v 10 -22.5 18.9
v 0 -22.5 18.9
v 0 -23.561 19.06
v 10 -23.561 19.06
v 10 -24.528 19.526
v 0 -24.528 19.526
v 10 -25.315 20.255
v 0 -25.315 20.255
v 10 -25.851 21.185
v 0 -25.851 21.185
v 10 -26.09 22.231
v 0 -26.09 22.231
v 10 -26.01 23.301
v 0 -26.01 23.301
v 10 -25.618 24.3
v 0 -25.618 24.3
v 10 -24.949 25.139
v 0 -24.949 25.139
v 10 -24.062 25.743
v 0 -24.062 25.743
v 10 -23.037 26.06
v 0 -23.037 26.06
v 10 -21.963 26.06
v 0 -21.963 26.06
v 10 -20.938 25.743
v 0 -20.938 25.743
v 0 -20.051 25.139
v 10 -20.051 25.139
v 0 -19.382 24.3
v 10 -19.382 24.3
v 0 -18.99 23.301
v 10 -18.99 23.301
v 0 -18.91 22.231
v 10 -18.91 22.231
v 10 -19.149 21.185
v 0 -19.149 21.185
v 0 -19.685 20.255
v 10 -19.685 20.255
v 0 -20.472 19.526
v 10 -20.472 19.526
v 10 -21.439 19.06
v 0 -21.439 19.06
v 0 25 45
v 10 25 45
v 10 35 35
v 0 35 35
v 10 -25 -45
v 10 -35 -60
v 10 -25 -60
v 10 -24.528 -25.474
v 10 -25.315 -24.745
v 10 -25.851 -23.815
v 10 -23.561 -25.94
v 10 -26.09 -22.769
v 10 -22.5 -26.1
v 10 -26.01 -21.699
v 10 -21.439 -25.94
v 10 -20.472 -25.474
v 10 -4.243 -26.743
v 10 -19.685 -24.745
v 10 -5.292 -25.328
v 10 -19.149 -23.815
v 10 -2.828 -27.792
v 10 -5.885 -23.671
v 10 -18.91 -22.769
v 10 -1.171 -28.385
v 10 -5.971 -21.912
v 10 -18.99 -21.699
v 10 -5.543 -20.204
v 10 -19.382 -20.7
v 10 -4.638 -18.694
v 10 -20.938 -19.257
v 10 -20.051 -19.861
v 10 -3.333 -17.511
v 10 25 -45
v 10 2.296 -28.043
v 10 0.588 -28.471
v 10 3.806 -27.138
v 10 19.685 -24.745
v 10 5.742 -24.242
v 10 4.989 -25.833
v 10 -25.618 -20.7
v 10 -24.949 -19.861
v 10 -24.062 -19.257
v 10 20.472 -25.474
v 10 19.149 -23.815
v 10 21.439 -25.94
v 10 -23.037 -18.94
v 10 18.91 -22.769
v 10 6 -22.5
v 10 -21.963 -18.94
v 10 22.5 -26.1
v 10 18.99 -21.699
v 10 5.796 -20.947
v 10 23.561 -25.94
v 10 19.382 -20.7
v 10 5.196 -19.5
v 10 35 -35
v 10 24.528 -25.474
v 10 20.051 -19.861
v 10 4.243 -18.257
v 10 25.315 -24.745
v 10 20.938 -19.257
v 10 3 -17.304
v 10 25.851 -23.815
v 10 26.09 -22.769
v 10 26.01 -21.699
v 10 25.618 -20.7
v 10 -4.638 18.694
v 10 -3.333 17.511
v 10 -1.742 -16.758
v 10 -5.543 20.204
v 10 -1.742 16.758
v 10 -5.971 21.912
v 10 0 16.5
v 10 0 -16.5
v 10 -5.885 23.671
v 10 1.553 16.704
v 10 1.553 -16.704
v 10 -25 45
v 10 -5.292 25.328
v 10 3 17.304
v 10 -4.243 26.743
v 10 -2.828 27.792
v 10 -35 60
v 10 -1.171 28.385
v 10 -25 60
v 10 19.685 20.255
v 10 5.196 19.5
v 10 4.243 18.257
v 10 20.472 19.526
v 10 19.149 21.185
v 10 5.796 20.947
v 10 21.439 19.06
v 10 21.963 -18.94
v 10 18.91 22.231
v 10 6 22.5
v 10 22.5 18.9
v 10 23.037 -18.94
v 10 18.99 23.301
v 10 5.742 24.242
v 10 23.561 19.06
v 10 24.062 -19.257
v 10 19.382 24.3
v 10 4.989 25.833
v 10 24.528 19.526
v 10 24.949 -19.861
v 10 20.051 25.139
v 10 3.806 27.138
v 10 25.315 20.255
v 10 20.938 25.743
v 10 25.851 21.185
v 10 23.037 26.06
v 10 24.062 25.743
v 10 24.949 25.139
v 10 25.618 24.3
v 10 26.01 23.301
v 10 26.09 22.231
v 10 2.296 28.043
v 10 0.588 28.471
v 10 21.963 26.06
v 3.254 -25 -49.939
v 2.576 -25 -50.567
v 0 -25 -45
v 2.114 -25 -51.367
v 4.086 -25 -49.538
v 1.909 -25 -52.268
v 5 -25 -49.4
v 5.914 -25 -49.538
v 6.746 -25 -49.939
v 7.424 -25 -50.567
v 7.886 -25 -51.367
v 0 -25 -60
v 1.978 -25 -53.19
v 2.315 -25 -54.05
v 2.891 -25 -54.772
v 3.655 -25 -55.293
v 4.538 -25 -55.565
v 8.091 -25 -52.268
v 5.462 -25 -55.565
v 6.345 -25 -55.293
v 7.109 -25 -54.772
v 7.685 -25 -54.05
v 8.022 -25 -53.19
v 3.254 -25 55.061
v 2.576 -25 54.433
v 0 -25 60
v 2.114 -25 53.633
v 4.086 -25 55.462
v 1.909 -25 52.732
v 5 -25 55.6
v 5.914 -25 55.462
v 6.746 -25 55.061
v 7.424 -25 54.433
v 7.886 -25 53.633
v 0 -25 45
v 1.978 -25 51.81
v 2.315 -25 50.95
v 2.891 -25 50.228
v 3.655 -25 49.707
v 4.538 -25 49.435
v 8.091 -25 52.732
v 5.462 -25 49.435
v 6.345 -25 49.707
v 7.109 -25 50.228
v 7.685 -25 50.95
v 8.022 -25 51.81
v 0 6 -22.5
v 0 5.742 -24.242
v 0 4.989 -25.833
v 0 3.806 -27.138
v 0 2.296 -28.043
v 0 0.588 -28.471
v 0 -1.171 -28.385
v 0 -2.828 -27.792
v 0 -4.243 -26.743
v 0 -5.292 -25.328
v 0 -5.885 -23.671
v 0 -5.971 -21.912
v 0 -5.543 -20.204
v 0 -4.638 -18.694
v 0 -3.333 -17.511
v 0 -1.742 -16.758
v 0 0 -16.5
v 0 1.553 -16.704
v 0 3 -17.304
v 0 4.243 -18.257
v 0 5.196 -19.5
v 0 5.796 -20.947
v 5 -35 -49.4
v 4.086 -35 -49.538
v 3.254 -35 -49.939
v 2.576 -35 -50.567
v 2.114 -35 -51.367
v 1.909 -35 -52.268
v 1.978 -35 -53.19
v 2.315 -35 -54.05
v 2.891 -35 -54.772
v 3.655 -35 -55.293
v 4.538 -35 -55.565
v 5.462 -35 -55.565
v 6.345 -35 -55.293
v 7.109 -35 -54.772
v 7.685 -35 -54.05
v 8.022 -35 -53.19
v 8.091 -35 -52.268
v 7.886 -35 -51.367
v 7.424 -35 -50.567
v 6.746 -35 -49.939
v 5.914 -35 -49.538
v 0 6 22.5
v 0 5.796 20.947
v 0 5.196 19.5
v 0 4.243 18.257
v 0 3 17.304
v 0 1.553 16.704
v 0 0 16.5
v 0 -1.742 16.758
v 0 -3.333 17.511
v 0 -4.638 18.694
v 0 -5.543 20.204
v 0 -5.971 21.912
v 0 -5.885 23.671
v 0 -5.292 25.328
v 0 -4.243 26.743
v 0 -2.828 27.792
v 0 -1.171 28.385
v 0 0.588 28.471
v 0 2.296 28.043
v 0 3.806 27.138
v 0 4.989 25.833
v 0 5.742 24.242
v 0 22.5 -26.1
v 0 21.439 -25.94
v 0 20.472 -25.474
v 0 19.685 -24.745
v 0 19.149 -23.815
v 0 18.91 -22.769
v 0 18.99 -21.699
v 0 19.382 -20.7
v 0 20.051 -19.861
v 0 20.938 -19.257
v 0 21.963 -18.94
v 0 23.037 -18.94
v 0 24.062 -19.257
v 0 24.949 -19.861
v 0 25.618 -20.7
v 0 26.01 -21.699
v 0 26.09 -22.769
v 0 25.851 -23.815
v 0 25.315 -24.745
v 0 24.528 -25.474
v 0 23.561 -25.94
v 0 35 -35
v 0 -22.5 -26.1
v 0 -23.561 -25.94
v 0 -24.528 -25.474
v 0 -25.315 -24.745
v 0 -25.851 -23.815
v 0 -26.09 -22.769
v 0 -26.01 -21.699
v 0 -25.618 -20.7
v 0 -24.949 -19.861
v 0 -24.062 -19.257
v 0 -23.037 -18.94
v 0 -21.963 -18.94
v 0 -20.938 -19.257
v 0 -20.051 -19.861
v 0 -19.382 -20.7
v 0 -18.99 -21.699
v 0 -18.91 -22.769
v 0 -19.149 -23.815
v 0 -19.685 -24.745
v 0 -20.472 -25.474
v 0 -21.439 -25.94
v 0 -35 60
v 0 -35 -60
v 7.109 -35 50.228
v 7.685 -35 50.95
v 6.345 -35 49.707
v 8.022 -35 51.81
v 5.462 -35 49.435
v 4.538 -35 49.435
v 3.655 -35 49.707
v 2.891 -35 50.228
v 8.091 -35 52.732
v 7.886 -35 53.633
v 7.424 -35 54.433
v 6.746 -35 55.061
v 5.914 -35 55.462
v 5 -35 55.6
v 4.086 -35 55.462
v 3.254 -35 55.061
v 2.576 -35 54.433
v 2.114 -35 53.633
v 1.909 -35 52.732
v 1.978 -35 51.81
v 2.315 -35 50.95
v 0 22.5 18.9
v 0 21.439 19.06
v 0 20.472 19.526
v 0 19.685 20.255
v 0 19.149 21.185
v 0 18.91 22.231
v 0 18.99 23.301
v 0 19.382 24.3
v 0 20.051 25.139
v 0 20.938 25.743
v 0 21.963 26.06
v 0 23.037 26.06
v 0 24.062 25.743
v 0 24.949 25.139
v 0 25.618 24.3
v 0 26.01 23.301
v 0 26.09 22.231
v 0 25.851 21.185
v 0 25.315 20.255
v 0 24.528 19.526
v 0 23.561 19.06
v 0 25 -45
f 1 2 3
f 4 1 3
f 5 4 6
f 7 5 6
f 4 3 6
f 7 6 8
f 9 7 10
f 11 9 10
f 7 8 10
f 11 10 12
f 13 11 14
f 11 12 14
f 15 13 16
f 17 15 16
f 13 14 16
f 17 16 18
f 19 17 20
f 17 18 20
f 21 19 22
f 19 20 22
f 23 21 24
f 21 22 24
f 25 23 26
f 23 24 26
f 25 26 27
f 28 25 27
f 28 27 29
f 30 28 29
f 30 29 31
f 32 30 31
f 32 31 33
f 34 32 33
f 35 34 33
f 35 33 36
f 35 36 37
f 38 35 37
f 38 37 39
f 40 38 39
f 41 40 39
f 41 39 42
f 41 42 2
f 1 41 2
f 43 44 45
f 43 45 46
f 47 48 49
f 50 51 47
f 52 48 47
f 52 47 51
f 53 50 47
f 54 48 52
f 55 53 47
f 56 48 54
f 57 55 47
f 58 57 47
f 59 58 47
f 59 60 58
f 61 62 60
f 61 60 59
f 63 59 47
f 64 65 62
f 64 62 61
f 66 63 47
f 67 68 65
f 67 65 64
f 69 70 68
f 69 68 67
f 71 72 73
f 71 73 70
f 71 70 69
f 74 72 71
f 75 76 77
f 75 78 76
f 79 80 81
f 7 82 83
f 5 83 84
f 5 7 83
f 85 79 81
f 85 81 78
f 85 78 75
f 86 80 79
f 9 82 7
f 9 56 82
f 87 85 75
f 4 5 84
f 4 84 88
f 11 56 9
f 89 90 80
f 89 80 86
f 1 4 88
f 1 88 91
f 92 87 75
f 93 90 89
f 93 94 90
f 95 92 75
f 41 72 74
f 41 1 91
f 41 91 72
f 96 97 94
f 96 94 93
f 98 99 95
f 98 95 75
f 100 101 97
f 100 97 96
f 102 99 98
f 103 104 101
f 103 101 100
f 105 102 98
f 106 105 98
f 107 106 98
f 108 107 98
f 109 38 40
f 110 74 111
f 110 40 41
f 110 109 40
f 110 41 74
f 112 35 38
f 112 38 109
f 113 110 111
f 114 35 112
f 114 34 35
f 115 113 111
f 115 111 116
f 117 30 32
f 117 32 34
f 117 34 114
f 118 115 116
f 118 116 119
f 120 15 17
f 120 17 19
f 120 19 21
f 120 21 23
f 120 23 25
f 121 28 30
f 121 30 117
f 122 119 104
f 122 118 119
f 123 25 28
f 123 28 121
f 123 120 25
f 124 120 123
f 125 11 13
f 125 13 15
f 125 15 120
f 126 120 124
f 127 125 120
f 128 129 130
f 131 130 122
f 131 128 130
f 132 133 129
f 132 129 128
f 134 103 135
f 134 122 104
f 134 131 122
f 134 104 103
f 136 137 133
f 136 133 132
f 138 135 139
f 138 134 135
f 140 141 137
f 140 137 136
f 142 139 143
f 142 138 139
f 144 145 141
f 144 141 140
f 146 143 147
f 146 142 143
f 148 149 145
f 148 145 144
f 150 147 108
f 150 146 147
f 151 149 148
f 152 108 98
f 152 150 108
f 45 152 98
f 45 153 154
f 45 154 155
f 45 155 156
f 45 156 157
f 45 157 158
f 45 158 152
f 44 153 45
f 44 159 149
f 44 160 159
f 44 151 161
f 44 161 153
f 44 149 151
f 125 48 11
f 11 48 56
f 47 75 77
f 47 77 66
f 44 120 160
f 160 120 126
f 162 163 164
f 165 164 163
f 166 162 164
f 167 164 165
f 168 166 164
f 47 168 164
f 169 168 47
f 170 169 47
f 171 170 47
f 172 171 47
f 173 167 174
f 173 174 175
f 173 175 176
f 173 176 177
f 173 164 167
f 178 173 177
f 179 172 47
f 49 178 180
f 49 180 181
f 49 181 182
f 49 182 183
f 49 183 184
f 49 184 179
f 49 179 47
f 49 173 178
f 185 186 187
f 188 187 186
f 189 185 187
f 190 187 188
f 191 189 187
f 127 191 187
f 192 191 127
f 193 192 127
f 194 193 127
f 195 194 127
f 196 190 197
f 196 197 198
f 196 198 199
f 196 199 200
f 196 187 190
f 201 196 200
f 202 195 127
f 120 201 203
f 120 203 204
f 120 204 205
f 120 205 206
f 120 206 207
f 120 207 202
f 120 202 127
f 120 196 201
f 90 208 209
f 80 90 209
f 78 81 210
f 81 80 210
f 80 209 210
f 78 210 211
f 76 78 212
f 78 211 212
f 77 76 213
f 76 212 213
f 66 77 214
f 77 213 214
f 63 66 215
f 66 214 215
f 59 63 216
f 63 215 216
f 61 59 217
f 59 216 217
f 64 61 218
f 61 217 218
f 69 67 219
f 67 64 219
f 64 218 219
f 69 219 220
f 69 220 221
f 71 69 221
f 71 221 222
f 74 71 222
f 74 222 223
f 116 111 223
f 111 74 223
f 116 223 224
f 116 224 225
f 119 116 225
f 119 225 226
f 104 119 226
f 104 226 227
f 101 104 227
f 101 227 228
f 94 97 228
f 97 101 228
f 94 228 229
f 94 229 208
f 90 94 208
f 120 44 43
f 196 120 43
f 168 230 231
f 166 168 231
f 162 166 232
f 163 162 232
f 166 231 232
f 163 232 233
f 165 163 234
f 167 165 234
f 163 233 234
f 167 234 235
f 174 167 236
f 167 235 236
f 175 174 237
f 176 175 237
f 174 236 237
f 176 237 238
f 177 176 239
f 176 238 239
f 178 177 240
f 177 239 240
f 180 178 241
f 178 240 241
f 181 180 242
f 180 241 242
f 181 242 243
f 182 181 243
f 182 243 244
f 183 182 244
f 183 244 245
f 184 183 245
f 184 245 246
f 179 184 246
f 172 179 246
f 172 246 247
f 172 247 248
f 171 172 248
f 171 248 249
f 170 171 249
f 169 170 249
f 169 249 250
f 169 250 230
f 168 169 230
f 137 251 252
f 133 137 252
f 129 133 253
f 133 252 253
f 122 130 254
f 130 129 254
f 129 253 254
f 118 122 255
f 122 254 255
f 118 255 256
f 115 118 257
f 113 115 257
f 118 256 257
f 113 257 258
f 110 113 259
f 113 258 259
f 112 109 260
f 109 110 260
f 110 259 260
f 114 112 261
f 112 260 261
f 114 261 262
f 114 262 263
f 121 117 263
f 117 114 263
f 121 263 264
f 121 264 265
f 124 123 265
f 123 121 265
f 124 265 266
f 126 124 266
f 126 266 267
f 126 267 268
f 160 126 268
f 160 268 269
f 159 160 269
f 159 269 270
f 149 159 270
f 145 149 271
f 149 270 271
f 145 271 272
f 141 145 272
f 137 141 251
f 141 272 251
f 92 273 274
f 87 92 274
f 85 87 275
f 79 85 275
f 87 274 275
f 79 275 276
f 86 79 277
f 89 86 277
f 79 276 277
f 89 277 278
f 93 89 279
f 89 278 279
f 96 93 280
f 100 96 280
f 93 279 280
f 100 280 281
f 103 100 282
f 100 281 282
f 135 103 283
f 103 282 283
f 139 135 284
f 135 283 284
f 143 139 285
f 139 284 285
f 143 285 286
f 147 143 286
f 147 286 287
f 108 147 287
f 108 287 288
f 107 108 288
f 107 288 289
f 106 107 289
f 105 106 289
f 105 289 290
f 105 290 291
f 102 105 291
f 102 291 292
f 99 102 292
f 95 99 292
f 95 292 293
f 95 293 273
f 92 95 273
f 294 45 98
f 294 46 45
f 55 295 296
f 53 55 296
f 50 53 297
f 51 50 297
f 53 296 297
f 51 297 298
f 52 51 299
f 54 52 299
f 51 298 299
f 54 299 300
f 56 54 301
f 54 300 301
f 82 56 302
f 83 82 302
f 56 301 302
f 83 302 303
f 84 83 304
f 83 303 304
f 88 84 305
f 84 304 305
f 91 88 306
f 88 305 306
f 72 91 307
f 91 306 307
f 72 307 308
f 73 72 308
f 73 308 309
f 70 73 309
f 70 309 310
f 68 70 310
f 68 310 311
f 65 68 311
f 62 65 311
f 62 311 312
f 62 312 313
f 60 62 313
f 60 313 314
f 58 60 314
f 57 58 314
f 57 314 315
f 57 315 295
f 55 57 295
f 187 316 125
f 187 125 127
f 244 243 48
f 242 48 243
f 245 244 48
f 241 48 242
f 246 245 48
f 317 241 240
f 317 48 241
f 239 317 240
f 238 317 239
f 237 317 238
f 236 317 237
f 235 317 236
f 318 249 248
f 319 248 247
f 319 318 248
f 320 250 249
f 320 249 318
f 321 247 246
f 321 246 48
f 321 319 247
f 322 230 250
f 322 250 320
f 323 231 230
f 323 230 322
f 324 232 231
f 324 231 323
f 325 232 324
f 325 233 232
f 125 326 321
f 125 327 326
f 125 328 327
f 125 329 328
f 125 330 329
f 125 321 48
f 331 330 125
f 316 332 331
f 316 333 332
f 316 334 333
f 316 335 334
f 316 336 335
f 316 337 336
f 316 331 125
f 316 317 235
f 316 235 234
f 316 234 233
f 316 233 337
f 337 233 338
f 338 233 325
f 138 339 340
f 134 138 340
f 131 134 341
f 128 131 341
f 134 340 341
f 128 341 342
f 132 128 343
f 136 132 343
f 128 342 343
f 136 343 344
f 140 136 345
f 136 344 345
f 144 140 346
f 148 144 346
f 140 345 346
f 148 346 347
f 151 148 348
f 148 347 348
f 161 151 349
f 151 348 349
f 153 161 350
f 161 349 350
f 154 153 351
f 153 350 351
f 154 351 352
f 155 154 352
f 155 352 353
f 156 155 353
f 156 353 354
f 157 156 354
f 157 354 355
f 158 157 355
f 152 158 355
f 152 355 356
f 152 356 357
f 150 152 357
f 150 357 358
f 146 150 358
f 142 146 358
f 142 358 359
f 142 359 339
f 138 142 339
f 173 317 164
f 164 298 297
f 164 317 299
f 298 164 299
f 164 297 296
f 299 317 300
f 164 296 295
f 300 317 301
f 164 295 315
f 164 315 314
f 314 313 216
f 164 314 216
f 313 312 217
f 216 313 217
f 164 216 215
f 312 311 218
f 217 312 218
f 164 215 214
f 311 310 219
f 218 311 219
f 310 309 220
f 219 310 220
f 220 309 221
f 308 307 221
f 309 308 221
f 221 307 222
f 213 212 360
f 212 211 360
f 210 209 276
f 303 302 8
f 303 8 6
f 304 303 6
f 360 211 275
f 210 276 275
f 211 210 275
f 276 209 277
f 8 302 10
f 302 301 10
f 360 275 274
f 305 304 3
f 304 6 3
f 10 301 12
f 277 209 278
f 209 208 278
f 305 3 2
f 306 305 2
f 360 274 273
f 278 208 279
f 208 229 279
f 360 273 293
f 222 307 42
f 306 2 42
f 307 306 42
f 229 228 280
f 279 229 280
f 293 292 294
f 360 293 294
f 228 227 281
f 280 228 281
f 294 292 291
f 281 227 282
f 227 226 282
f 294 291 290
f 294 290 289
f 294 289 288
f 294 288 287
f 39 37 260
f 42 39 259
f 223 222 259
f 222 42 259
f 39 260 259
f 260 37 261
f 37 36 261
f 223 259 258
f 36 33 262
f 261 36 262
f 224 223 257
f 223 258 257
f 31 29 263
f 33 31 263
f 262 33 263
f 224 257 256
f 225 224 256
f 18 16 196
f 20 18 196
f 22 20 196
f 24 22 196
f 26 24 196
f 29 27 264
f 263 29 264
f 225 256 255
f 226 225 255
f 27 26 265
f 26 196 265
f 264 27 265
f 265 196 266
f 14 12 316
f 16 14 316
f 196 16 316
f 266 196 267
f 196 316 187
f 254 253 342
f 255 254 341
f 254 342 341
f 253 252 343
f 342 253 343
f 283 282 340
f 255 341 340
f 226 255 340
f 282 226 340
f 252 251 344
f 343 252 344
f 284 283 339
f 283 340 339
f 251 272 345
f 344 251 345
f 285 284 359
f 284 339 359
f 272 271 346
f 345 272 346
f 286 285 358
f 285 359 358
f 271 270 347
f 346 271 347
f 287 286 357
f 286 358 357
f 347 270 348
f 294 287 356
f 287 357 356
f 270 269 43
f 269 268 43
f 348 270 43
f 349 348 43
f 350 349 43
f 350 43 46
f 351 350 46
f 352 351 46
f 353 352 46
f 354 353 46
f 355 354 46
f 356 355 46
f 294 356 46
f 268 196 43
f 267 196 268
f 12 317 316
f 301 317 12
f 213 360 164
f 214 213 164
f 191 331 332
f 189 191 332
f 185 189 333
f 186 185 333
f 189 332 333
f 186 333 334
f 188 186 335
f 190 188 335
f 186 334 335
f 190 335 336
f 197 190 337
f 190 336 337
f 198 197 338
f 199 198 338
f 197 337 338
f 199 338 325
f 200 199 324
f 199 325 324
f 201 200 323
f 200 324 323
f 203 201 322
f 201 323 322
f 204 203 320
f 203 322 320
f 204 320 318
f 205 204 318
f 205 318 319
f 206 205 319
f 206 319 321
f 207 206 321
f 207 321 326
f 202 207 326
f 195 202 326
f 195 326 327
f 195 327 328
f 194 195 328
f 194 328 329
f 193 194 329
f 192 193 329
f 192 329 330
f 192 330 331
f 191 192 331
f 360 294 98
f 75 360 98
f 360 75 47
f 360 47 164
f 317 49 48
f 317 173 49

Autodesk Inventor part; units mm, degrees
ref_plane "YZ Plane" through (0, 0, 0) normal (1, 0, 0) x (0, 1, 0)
ref_plane "XZ Plane" through (0, 0, 0) normal (0, 1, 0) x (-1, 0, 0)
ref_plane "XY Plane" through (0, 0, 0) normal (0, 0, 1) x (1, 0, 0)
sketch "Sketch1" plane through (0, 0, 0) normal (1, 0, 0) x (0, 1, 0)
  line L0 (-35, 60) -> (35, 60)
  line L1 (35, 60) -> (35, -60)
  line L2 (35, -60) -> (-35, -60)
  line L3 (-35, -60) -> (-35, 60)
  line L4 (-35, 60) -> (35, -60) construction
  line L5 (35, 60) -> (-35, -60) construction
  line L6 (0, 60) -> (0, -60) construction
  line L7 (20, 60) -> (35, -15)
  line L8 (0, 22.5) -> (0, -22.5)
  line L9 (-35, 0) -> (35, 0) construction
  circle A0 centre (0, 22.5) radius 18 construction
  circle A1 centre (0, -22.5) radius 26 construction
  line L10 (-35, 51) -> (35, 51)
  circle A2 centre (0, 22.5) radius 6
  circle A3 centre (0, -22.5) radius 6
  point P0 (0, 0)
  point P1 (21.8, 51)
  dimension "d0" = 35
  dimension "d1" = 120
  dimension "d2" = 45
  dimension "d3" = 52
  dimension "d4" = 36
  dimension "d5" = 75
  dimension "d6" = 15
  dimension "d7" = 9
  dimension "d8" = 12
  dimension "d9" = 12
extrude "Extrusion1" add sketch "Sketch1" along normal blind 10
sketch "Sketch2" plane through (0, 35, -15) normal (0, 1, 0) x (1, 0, 0)
  line L0 (0, 45) -> (0, -75) construction
  line L1 (10, 45) -> (10, -75) projected
  line L2 (0, 45) -> (10, 45) projected
  line L3 (0, 0) -> (0, -66) projected
  line L4 (0, -66) -> (10, -66) construction
  line L5 (10, 0) -> (10, -66) projected
  line L6 (0, 0) -> (10, 0) projected
  line L7 (0, 45) -> (10, 45) projected
  line L8 (0, 45) -> (10, 45)
  line L9 (10, 45) -> (10, 30)
  line L10 (10, 30) -> (0, 30)
  line L11 (0, 30) -> (0, 45)
  line L12 (0, -75) -> (10, -75) projected
  line L13 (0, 45) -> (0, -75) projected
  line L14 (0, -75) -> (10, -75)
  line L15 (10, -75) -> (10, -60)
  line L16 (10, -60) -> (0, -60)
  line L17 (0, -60) -> (0, -75)
  point P0 (0, -15)
  point P1 (0, 30)
  point P2 (0, -60)
  dimension "d36" = 15
  dimension "d37" = 15
extrude "Extrusion2" cut sketch "Sketch2" against normal blind 60 contours L1 L10 L11 L2 | L1 L12 L13 L3 L16
sketch "Sketch3" plane through (10, 0, 0) normal (1, 0, 0) x (0, 0, -1)
  line L0 (45, 35) -> (-45, 35) projected
  line L1 (-60, -35) -> (60, -35) projected
  line L2 (60, -35) -> (60, -25) projected
  circle A0 centre (-22.5, 0) radius 6 projected
  circle A1 centre (22.5, 0) radius 6 projected
  line L3 (-22.5, 22.5) -> (-22.5, -22.5)
  line L4 (-22.5, 0) -> (22.5, 0) construction
  line L5 (22.5, 22.5) -> (22.5, -22.5)
  line L6 (-60, -25) -> (-60, -35) projected
  line L7 (45, -25) -> (45, 35) projected
  line L8 (-45, 35) -> (-45, -25) projected
  line L9 (-45, -25) -> (-60, -25) projected
  line L10 (60, -25) -> (45, -25) projected
  point P0 (0, 0)
  dimension "d16" = 45
hole "Hole1" at (10, 22.5, 22.5) at (10, -22.5, 22.5) at (10, 22.5, -22.5) at (10, -22.5, -22.5) direction (-1, 0, 0) diameter 7.2 end through all
sketch "Sketch4" plane through (0, -25, -15) normal (0, 1, 0) x (1, 0, 0)
  line L0 (0, 30) -> (0, 45) projected
  line L1 (10, -60) -> (10, -75) projected
  line L2 (10, 45) -> (10, 30) projected
  line L3 (0, 45) -> (10, 45) projected
  line L4 (0, 30) -> (0, 45) projected
  line L5 (10, 30) -> (0, 30) projected
  line L6 (5, -75) -> (5, 45)
  line L7 (10, 45) -> (10, 30) projected
  line L8 (0, 45) -> (10, 45) projected
  line L9 (10, 30) -> (0, 30) projected
  line L10 (0, -75) -> (0, -60) projected
  line L11 (10, -75) -> (0, -75) projected
  line L12 (0, -60) -> (10, -60) projected
  point P0 (0, -15)
  point P1 (5, -67.5)
  point P2 (5, 37.5)
  dimension "d24" = 7.5
  dimension "d38" = 7.5
hole "Hole2" at (5, -25, 52.5) at (5, -25, -52.5) direction (0, -1, 0) diameter 6.2 end through all
chamfer "Chamfer1" distance 10 angle 45 2 edges at (5, 35, -45) (5, 35, 45)
properties part number "22_Hop_so_ngang" material "Stainless Steel, Austenitic"
